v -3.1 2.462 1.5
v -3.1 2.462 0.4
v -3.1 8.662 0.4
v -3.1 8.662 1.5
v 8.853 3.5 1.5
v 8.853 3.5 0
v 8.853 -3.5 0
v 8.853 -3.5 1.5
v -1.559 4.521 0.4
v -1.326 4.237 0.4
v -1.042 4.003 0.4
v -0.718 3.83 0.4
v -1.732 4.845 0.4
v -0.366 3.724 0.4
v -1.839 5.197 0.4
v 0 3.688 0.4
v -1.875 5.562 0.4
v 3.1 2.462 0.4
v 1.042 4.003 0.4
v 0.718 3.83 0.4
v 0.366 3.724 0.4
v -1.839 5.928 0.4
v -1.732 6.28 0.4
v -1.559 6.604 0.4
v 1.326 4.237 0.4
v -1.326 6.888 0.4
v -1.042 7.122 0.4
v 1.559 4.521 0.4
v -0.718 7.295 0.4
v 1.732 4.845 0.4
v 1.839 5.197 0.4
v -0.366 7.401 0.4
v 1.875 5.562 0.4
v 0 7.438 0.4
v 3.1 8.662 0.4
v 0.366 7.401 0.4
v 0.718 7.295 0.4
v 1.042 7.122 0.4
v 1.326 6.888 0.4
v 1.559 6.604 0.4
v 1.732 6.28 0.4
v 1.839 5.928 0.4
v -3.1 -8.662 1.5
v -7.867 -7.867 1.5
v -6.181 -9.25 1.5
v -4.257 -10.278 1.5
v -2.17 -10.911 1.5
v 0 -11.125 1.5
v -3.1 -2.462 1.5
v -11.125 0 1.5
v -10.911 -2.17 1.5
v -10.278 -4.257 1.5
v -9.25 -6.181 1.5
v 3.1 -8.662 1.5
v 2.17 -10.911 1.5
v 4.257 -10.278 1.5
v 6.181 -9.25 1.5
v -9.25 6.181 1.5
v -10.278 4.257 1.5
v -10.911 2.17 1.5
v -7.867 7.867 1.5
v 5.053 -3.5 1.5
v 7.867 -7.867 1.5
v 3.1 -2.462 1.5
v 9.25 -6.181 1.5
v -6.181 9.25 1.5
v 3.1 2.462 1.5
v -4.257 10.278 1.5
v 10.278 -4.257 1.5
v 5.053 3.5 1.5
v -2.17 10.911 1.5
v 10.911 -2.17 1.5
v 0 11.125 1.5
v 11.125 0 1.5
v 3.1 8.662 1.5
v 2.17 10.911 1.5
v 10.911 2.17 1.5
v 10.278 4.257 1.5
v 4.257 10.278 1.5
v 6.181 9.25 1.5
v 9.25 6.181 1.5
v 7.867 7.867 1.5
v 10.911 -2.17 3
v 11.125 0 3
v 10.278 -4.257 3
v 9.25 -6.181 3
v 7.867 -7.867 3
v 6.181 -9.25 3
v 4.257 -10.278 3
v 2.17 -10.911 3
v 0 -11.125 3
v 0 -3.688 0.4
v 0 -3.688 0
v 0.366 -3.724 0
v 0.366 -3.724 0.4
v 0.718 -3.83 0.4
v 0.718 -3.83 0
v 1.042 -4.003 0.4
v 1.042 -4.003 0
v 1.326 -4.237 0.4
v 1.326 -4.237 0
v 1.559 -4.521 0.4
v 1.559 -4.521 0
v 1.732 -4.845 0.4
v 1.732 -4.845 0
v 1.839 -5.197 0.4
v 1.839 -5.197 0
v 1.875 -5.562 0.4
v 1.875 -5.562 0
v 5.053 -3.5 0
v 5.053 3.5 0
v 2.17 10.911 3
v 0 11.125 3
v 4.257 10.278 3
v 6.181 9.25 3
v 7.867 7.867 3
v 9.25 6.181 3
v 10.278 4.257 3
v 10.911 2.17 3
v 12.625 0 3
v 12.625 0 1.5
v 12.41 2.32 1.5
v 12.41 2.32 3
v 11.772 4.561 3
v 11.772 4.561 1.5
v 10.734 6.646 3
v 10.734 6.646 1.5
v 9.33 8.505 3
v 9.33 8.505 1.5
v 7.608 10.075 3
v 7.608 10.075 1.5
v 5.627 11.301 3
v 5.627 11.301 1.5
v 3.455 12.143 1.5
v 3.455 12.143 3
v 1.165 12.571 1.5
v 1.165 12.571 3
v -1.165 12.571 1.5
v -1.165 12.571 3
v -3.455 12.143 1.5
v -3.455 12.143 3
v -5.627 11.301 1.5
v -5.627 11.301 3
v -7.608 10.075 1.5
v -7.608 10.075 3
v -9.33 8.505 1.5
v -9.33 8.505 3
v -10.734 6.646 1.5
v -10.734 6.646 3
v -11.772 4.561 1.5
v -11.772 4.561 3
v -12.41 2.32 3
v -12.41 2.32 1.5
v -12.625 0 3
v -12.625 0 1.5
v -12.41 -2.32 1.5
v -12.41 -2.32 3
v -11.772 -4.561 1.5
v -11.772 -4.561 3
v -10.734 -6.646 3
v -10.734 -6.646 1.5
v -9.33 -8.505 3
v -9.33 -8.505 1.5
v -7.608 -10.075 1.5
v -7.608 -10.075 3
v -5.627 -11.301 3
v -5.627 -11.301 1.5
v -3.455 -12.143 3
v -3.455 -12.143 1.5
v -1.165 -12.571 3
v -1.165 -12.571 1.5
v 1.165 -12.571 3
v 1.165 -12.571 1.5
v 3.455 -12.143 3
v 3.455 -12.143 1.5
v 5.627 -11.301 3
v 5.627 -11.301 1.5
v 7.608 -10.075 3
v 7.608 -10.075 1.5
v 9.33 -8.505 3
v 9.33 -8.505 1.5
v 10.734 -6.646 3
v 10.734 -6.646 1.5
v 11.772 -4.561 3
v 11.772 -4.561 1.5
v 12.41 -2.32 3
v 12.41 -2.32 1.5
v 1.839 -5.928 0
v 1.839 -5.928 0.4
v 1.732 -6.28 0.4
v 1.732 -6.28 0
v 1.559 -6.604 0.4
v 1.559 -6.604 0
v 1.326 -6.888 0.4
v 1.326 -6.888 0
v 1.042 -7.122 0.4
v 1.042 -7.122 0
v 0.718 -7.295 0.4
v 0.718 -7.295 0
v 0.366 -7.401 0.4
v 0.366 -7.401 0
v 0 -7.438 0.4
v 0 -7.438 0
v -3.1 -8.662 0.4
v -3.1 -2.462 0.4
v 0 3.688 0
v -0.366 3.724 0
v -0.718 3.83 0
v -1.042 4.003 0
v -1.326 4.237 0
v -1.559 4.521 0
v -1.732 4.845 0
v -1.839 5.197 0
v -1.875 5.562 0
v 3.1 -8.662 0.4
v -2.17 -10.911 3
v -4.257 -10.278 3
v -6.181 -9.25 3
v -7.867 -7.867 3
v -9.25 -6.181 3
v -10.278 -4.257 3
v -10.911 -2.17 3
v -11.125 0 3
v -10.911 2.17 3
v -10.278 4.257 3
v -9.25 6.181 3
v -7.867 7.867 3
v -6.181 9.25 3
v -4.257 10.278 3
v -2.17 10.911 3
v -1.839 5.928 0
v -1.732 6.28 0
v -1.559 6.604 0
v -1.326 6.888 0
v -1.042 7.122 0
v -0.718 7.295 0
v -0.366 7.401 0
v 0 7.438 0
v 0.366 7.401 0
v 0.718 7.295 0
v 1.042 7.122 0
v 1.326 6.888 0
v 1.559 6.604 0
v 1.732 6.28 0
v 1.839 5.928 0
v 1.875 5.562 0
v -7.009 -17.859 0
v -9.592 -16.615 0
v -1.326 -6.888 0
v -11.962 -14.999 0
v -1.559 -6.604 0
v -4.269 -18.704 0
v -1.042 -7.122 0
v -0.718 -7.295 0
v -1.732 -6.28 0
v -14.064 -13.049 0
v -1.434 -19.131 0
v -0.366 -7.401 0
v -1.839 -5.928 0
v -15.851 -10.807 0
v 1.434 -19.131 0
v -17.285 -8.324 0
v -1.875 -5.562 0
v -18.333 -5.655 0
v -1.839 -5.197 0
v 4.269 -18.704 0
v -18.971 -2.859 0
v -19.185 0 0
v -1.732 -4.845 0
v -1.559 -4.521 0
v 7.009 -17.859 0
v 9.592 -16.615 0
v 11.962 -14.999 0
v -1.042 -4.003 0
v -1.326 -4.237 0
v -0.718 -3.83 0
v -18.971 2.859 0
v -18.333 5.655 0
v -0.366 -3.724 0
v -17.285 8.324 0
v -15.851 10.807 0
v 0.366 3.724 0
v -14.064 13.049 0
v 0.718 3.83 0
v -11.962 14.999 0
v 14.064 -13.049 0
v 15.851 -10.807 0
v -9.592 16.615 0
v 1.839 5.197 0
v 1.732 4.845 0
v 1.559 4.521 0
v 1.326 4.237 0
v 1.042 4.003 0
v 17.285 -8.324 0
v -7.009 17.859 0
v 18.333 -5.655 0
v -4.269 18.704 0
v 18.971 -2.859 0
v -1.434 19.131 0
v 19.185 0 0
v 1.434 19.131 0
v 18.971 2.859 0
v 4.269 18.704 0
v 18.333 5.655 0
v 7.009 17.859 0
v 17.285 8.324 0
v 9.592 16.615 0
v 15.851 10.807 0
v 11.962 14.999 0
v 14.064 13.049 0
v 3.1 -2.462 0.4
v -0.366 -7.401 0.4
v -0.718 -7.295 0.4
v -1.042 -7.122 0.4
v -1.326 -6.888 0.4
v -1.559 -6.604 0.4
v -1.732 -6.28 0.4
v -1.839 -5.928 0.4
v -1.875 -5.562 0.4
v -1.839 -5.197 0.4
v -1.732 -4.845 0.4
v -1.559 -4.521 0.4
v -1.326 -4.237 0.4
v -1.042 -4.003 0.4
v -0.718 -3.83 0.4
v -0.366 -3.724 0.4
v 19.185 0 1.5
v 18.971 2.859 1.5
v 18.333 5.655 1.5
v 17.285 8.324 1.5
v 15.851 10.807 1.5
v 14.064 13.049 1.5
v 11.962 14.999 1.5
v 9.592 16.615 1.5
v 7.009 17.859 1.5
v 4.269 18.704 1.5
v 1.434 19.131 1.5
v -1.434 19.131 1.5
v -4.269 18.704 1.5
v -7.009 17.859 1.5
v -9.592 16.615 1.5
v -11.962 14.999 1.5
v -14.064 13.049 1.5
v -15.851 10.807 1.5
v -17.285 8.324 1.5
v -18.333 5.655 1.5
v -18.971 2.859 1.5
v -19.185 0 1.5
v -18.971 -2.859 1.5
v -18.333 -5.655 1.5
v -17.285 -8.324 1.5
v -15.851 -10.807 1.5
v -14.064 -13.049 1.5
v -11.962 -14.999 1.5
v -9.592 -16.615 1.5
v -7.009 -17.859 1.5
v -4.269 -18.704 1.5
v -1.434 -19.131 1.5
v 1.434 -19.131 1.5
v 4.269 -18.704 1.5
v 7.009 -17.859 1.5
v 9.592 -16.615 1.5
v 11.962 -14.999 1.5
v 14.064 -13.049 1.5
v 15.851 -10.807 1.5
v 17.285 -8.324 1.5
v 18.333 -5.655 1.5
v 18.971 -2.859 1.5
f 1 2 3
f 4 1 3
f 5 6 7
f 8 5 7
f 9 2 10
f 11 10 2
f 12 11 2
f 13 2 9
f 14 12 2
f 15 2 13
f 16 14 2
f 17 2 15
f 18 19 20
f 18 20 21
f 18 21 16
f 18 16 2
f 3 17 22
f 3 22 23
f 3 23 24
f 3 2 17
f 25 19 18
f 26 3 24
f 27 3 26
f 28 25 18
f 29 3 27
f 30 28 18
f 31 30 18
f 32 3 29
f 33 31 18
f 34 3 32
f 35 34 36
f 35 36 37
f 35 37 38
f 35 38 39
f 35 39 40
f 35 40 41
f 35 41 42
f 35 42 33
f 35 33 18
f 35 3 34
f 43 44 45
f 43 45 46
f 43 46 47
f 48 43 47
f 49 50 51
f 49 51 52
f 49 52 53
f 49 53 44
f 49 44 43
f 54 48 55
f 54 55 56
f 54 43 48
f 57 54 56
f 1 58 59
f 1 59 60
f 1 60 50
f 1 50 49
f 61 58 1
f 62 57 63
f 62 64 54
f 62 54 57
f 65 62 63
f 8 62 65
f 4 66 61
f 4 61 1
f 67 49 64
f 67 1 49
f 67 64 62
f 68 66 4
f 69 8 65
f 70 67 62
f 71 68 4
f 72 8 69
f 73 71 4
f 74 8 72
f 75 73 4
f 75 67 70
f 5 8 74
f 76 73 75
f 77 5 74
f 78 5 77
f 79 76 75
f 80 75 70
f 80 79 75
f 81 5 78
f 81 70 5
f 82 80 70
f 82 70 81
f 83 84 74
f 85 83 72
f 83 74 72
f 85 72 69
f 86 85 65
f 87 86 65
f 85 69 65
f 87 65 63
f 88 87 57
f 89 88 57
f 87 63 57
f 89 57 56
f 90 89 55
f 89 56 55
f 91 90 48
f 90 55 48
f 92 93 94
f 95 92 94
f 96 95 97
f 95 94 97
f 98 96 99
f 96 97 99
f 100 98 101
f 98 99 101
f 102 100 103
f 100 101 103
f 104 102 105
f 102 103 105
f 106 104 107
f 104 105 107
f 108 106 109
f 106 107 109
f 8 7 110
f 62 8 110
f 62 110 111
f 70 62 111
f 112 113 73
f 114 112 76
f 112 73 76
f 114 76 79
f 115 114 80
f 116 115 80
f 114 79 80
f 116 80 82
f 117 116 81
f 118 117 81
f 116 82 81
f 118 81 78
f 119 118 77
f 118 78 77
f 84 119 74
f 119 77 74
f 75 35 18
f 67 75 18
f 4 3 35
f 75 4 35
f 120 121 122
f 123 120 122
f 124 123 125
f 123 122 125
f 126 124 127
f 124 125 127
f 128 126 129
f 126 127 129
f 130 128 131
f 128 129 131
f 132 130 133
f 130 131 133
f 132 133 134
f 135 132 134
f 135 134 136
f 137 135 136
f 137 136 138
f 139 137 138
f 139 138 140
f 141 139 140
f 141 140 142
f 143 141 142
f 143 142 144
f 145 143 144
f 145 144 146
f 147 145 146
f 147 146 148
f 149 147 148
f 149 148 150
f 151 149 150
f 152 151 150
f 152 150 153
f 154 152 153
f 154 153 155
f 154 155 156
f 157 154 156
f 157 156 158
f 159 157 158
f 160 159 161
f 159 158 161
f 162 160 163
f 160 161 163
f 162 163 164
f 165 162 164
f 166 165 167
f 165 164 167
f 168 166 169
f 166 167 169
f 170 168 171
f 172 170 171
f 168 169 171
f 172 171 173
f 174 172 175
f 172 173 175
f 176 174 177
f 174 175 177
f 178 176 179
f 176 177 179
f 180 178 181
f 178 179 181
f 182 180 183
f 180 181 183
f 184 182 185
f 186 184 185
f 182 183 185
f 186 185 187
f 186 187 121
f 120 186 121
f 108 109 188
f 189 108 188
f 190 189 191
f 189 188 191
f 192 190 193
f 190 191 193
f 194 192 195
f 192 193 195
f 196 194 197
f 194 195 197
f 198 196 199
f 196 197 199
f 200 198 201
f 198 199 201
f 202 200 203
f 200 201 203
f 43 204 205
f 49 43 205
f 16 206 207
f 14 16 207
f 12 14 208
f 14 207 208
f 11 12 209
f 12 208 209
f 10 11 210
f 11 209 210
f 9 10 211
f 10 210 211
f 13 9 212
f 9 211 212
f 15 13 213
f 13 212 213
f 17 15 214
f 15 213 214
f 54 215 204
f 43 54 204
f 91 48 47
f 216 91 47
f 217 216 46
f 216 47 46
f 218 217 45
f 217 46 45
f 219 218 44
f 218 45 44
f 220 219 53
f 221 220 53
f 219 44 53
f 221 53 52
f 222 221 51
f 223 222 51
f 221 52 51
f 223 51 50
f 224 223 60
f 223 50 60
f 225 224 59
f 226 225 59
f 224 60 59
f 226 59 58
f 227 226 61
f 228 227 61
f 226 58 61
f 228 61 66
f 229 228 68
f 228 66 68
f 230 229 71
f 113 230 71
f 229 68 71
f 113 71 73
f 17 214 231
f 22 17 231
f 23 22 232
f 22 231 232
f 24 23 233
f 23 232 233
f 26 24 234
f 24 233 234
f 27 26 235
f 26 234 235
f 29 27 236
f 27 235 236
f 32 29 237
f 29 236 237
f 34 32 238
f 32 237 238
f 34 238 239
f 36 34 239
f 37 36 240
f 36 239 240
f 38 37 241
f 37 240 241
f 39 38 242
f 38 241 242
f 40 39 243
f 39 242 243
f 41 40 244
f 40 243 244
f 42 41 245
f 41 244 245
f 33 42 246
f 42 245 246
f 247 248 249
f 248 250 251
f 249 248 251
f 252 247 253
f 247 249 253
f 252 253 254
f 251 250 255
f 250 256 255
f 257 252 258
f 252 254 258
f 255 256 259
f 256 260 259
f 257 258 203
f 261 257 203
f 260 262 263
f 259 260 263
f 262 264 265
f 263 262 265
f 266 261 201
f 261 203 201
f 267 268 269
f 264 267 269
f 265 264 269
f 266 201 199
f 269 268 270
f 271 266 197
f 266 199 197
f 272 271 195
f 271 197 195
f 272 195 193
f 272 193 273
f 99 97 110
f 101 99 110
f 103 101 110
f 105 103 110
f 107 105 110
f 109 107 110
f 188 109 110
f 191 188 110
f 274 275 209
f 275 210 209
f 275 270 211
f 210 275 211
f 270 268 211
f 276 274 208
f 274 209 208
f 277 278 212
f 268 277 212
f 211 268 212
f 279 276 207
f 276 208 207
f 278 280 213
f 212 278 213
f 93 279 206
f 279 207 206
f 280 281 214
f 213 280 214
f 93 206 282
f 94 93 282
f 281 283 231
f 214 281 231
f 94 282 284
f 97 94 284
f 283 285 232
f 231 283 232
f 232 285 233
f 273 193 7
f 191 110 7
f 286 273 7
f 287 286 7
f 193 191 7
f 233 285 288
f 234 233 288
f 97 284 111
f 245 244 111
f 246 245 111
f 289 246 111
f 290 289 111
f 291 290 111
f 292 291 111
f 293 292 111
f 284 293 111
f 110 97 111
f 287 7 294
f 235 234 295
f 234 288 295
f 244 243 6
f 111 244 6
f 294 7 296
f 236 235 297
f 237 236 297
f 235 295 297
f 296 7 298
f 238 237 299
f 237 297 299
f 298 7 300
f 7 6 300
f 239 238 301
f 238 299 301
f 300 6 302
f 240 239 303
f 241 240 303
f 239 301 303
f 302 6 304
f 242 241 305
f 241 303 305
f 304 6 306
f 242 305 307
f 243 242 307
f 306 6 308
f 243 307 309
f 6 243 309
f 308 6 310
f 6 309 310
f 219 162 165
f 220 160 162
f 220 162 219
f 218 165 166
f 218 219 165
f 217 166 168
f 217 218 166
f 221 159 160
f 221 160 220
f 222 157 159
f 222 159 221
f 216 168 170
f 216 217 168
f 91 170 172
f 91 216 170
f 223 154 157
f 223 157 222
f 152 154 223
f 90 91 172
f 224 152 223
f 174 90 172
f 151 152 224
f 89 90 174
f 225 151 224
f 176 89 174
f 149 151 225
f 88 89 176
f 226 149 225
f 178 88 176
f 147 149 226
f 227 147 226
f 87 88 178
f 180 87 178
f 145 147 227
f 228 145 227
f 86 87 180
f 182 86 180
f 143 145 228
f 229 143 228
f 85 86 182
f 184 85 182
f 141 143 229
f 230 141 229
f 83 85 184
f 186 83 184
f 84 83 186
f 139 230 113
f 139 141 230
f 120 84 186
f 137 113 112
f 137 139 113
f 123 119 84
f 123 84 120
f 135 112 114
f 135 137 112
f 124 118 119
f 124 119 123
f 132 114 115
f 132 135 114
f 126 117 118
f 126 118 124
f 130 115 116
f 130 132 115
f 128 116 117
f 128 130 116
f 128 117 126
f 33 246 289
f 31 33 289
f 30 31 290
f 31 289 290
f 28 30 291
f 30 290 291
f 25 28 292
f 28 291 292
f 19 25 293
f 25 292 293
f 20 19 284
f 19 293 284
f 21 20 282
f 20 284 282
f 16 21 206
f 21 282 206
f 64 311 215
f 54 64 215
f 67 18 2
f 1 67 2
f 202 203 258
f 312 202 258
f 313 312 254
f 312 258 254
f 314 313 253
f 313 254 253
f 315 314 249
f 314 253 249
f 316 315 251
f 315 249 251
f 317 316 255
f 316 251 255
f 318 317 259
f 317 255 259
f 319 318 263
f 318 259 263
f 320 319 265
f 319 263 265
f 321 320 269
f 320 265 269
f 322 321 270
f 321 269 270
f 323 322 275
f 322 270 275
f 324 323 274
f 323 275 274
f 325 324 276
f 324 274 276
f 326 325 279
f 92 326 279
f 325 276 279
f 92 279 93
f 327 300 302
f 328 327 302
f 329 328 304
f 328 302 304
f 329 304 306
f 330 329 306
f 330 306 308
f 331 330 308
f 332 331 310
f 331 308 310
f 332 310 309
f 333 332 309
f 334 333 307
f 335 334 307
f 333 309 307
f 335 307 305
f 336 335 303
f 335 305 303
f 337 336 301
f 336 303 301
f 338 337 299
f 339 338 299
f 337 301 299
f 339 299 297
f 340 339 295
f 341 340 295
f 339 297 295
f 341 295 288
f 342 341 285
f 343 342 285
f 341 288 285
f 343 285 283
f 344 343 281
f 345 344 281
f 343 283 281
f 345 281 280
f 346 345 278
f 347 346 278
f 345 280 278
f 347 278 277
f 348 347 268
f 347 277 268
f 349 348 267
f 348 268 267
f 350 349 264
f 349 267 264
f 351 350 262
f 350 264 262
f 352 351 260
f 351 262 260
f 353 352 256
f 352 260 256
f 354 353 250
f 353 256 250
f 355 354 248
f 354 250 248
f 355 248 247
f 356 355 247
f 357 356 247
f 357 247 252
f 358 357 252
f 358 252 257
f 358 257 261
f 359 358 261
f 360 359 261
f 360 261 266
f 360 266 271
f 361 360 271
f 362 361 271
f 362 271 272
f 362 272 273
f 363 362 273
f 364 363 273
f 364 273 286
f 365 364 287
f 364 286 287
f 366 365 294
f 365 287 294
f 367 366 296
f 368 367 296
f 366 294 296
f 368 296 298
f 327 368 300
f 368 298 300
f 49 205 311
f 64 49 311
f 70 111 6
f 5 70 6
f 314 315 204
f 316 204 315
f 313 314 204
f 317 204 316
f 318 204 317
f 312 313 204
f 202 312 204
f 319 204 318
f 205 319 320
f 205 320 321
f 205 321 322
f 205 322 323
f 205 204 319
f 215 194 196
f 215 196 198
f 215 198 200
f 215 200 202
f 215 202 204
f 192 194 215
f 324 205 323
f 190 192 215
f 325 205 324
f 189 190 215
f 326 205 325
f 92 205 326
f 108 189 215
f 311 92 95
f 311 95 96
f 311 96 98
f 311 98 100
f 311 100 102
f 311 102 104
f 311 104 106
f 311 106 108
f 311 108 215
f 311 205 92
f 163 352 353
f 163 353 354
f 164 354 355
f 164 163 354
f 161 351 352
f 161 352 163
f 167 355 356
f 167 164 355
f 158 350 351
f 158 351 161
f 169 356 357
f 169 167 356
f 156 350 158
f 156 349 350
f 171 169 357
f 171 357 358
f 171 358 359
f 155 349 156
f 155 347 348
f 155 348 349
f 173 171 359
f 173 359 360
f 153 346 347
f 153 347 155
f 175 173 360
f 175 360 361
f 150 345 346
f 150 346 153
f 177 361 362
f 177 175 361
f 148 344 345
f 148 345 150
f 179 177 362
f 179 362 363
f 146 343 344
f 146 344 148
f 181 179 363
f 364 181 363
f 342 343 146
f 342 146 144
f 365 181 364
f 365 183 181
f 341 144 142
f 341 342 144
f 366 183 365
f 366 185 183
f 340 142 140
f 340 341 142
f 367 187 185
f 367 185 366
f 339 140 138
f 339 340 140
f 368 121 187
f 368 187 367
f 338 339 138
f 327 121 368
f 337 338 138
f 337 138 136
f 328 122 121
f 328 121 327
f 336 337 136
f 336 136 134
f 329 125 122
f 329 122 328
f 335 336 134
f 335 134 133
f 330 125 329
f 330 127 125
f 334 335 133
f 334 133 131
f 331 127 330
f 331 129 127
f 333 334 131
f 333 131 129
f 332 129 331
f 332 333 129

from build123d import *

# Parameters (mm, degrees)
F0_R     = 19.185
F0_R_2   = 12.625
F1_DEPTH = 1.5
F2_DEPTH = 3
F3_DEPTH = 1.5
F4_DEPTH = 0.4


with BuildPart() as f1:
    # F0 (on Top) → F1 (new body)
    with BuildSketch(Plane.XY):
        Circle(F0_R)
        Circle(F0_R_2, mode=Mode.SUBTRACT)
    extrude(amount=F1_DEPTH)

    # F0 (on Top) → F2 (join)
    with BuildSketch(Plane.XY):
        Circle(F0_R_2)
        with BuildLine():
            ThreePointArc((0, 11.125), (7.866563, 7.866563), (11.125, 0))
            ThreePointArc((11.125, 0), (7.866563, -7.866563), (0, -11.125))
            ThreePointArc((0, -11.125), (-11.125, 0), (0, 11.125))
        make_face(mode=Mode.SUBTRACT)
    extrude(amount=F2_DEPTH)

    # F0 (on Top) → F3 (join)
    with BuildSketch(Plane.XY):
        with BuildLine():
            Line((0, 8.6625), (0, 11.125))
            ThreePointArc((0, 11.125), (-11.125, 0), (0, -11.125))
            Line((0, -11.125), (0, -8.6625))
            Line((0, -8.6625), (-3.1, -8.6625))
            Line((-3.1, -8.6625), (-3.1, -2.4625))
            Line((-3.1, -2.4625), (0, -2.4625))
            Line((0, -2.4625), (0, 2.4625))
            Line((0, 2.4625), (-3.1, 2.4625))
            Line((-3.1, 2.4625), (-3.1, 5.5625))
            Line((-3.1, 5.5625), (-3.1, 8.6625))
            Line((-3.1, 8.6625), (0, 8.6625))
        make_face()
        with BuildLine():
            ThreePointArc((0, -11.125), (7.866563, -7.866563), (11.125, 0))
            ThreePointArc((11.125, 0), (7.866563, 7.866563), (0, 11.125))
            Line((0, 11.125), (0, 8.6625))
            Line((0, 8.6625), (3.1, 8.6625))
            Line((3.1, 8.6625), (3.1, 2.4625))
            Line((3.1, 2.4625), (0, 2.4625))
            Line((0, 2.4625), (0, -2.4625))
            Line((0, -2.4625), (3.1, -2.4625))
            Line((3.1, -2.4625), (3.1, -8.6625))
            Line((3.1, -8.6625), (0, -8.6625))
            Line((0, -8.6625), (0, -11.125))
        make_face()
        Polygon((8.853125, -3.5), (6.953125, -3.5), (5.053125, -3.5), (5.053125, 3.5), (6.953125, 3.5), (8.853125, 3.5), align=None, mode=Mode.SUBTRACT)
    extrude(amount=F3_DEPTH)

    # F0 (on Top) → F4 (join)
    with BuildSketch(Plane.XY):
        with BuildLine():
            Line((3.1, 8.6625), (0, 8.6625))
            Line((0, 8.6625), (0, 8.34375))
            Line((0, 8.34375), (0, 7.4375))
            ThreePointArc((0, 7.4375), (1.325825, 6.888325), (1.875, 5.5625))
            ThreePointArc((1.875, 5.5625), (1.325825, 4.236675), (0, 3.6875))
            Line((0, 3.6875), (0, 2.4625))
            Line((0, 2.4625), (3.1, 2.4625))
            Line((3.1, 2.4625), (3.1, 8.6625))
        make_face()
        with BuildLine():
            Line((0, 8.34375), (0, 8.6625))
            Line((0, 8.6625), (-3.1, 8.6625))
            Line((-3.1, 8.6625), (-3.1, 5.5625))
            Line((-3.1, 5.5625), (-1.875, 5.5625))
            ThreePointArc((-1.875, 5.5625), (-1.325825, 6.888325), (0, 7.4375))
            Line((0, 7.4375), (0, 8.34375))
        make_face()
        with BuildLine():
            Line((-1.875, 5.5625), (-3.1, 5.5625))
            Line((-3.1, 5.5625), (-3.1, 2.4625))
            Line((-3.1, 2.4625), (0, 2.4625))
            Line((0, 2.4625), (0, 3.6875))
            ThreePointArc((0, 3.6875), (-1.325825, 4.236675), (-1.875, 5.5625))
        make_face()
        with BuildLine():
            Line((0, -7.4375), (0, -8.6625))
            Line((0, -8.6625), (3.1, -8.6625))
            Line((3.1, -8.6625), (3.1, -2.4625))
            Line((3.1, -2.4625), (0, -2.4625))
            Line((0, -2.4625), (0, -3.6875))
            ThreePointArc((0, -3.6875), (1.325825, -4.236675), (1.875, -5.5625))
            ThreePointArc((1.875, -5.5625), (1.325825, -6.888325), (0, -7.4375))
        make_face()
        with BuildLine():
            Line((-3.1, -8.6625), (0, -8.6625))
            Line((0, -8.6625), (0, -7.4375))
            ThreePointArc((0, -7.4375), (-1.875, -5.5625), (0, -3.6875))
            Line((0, -3.6875), (0, -2.4625))
            Line((0, -2.4625), (-3.1, -2.4625))
            Line((-3.1, -2.4625), (-3.1, -8.6625))
        make_face()
    extrude(amount=F4_DEPTH)


solid = f1.part
